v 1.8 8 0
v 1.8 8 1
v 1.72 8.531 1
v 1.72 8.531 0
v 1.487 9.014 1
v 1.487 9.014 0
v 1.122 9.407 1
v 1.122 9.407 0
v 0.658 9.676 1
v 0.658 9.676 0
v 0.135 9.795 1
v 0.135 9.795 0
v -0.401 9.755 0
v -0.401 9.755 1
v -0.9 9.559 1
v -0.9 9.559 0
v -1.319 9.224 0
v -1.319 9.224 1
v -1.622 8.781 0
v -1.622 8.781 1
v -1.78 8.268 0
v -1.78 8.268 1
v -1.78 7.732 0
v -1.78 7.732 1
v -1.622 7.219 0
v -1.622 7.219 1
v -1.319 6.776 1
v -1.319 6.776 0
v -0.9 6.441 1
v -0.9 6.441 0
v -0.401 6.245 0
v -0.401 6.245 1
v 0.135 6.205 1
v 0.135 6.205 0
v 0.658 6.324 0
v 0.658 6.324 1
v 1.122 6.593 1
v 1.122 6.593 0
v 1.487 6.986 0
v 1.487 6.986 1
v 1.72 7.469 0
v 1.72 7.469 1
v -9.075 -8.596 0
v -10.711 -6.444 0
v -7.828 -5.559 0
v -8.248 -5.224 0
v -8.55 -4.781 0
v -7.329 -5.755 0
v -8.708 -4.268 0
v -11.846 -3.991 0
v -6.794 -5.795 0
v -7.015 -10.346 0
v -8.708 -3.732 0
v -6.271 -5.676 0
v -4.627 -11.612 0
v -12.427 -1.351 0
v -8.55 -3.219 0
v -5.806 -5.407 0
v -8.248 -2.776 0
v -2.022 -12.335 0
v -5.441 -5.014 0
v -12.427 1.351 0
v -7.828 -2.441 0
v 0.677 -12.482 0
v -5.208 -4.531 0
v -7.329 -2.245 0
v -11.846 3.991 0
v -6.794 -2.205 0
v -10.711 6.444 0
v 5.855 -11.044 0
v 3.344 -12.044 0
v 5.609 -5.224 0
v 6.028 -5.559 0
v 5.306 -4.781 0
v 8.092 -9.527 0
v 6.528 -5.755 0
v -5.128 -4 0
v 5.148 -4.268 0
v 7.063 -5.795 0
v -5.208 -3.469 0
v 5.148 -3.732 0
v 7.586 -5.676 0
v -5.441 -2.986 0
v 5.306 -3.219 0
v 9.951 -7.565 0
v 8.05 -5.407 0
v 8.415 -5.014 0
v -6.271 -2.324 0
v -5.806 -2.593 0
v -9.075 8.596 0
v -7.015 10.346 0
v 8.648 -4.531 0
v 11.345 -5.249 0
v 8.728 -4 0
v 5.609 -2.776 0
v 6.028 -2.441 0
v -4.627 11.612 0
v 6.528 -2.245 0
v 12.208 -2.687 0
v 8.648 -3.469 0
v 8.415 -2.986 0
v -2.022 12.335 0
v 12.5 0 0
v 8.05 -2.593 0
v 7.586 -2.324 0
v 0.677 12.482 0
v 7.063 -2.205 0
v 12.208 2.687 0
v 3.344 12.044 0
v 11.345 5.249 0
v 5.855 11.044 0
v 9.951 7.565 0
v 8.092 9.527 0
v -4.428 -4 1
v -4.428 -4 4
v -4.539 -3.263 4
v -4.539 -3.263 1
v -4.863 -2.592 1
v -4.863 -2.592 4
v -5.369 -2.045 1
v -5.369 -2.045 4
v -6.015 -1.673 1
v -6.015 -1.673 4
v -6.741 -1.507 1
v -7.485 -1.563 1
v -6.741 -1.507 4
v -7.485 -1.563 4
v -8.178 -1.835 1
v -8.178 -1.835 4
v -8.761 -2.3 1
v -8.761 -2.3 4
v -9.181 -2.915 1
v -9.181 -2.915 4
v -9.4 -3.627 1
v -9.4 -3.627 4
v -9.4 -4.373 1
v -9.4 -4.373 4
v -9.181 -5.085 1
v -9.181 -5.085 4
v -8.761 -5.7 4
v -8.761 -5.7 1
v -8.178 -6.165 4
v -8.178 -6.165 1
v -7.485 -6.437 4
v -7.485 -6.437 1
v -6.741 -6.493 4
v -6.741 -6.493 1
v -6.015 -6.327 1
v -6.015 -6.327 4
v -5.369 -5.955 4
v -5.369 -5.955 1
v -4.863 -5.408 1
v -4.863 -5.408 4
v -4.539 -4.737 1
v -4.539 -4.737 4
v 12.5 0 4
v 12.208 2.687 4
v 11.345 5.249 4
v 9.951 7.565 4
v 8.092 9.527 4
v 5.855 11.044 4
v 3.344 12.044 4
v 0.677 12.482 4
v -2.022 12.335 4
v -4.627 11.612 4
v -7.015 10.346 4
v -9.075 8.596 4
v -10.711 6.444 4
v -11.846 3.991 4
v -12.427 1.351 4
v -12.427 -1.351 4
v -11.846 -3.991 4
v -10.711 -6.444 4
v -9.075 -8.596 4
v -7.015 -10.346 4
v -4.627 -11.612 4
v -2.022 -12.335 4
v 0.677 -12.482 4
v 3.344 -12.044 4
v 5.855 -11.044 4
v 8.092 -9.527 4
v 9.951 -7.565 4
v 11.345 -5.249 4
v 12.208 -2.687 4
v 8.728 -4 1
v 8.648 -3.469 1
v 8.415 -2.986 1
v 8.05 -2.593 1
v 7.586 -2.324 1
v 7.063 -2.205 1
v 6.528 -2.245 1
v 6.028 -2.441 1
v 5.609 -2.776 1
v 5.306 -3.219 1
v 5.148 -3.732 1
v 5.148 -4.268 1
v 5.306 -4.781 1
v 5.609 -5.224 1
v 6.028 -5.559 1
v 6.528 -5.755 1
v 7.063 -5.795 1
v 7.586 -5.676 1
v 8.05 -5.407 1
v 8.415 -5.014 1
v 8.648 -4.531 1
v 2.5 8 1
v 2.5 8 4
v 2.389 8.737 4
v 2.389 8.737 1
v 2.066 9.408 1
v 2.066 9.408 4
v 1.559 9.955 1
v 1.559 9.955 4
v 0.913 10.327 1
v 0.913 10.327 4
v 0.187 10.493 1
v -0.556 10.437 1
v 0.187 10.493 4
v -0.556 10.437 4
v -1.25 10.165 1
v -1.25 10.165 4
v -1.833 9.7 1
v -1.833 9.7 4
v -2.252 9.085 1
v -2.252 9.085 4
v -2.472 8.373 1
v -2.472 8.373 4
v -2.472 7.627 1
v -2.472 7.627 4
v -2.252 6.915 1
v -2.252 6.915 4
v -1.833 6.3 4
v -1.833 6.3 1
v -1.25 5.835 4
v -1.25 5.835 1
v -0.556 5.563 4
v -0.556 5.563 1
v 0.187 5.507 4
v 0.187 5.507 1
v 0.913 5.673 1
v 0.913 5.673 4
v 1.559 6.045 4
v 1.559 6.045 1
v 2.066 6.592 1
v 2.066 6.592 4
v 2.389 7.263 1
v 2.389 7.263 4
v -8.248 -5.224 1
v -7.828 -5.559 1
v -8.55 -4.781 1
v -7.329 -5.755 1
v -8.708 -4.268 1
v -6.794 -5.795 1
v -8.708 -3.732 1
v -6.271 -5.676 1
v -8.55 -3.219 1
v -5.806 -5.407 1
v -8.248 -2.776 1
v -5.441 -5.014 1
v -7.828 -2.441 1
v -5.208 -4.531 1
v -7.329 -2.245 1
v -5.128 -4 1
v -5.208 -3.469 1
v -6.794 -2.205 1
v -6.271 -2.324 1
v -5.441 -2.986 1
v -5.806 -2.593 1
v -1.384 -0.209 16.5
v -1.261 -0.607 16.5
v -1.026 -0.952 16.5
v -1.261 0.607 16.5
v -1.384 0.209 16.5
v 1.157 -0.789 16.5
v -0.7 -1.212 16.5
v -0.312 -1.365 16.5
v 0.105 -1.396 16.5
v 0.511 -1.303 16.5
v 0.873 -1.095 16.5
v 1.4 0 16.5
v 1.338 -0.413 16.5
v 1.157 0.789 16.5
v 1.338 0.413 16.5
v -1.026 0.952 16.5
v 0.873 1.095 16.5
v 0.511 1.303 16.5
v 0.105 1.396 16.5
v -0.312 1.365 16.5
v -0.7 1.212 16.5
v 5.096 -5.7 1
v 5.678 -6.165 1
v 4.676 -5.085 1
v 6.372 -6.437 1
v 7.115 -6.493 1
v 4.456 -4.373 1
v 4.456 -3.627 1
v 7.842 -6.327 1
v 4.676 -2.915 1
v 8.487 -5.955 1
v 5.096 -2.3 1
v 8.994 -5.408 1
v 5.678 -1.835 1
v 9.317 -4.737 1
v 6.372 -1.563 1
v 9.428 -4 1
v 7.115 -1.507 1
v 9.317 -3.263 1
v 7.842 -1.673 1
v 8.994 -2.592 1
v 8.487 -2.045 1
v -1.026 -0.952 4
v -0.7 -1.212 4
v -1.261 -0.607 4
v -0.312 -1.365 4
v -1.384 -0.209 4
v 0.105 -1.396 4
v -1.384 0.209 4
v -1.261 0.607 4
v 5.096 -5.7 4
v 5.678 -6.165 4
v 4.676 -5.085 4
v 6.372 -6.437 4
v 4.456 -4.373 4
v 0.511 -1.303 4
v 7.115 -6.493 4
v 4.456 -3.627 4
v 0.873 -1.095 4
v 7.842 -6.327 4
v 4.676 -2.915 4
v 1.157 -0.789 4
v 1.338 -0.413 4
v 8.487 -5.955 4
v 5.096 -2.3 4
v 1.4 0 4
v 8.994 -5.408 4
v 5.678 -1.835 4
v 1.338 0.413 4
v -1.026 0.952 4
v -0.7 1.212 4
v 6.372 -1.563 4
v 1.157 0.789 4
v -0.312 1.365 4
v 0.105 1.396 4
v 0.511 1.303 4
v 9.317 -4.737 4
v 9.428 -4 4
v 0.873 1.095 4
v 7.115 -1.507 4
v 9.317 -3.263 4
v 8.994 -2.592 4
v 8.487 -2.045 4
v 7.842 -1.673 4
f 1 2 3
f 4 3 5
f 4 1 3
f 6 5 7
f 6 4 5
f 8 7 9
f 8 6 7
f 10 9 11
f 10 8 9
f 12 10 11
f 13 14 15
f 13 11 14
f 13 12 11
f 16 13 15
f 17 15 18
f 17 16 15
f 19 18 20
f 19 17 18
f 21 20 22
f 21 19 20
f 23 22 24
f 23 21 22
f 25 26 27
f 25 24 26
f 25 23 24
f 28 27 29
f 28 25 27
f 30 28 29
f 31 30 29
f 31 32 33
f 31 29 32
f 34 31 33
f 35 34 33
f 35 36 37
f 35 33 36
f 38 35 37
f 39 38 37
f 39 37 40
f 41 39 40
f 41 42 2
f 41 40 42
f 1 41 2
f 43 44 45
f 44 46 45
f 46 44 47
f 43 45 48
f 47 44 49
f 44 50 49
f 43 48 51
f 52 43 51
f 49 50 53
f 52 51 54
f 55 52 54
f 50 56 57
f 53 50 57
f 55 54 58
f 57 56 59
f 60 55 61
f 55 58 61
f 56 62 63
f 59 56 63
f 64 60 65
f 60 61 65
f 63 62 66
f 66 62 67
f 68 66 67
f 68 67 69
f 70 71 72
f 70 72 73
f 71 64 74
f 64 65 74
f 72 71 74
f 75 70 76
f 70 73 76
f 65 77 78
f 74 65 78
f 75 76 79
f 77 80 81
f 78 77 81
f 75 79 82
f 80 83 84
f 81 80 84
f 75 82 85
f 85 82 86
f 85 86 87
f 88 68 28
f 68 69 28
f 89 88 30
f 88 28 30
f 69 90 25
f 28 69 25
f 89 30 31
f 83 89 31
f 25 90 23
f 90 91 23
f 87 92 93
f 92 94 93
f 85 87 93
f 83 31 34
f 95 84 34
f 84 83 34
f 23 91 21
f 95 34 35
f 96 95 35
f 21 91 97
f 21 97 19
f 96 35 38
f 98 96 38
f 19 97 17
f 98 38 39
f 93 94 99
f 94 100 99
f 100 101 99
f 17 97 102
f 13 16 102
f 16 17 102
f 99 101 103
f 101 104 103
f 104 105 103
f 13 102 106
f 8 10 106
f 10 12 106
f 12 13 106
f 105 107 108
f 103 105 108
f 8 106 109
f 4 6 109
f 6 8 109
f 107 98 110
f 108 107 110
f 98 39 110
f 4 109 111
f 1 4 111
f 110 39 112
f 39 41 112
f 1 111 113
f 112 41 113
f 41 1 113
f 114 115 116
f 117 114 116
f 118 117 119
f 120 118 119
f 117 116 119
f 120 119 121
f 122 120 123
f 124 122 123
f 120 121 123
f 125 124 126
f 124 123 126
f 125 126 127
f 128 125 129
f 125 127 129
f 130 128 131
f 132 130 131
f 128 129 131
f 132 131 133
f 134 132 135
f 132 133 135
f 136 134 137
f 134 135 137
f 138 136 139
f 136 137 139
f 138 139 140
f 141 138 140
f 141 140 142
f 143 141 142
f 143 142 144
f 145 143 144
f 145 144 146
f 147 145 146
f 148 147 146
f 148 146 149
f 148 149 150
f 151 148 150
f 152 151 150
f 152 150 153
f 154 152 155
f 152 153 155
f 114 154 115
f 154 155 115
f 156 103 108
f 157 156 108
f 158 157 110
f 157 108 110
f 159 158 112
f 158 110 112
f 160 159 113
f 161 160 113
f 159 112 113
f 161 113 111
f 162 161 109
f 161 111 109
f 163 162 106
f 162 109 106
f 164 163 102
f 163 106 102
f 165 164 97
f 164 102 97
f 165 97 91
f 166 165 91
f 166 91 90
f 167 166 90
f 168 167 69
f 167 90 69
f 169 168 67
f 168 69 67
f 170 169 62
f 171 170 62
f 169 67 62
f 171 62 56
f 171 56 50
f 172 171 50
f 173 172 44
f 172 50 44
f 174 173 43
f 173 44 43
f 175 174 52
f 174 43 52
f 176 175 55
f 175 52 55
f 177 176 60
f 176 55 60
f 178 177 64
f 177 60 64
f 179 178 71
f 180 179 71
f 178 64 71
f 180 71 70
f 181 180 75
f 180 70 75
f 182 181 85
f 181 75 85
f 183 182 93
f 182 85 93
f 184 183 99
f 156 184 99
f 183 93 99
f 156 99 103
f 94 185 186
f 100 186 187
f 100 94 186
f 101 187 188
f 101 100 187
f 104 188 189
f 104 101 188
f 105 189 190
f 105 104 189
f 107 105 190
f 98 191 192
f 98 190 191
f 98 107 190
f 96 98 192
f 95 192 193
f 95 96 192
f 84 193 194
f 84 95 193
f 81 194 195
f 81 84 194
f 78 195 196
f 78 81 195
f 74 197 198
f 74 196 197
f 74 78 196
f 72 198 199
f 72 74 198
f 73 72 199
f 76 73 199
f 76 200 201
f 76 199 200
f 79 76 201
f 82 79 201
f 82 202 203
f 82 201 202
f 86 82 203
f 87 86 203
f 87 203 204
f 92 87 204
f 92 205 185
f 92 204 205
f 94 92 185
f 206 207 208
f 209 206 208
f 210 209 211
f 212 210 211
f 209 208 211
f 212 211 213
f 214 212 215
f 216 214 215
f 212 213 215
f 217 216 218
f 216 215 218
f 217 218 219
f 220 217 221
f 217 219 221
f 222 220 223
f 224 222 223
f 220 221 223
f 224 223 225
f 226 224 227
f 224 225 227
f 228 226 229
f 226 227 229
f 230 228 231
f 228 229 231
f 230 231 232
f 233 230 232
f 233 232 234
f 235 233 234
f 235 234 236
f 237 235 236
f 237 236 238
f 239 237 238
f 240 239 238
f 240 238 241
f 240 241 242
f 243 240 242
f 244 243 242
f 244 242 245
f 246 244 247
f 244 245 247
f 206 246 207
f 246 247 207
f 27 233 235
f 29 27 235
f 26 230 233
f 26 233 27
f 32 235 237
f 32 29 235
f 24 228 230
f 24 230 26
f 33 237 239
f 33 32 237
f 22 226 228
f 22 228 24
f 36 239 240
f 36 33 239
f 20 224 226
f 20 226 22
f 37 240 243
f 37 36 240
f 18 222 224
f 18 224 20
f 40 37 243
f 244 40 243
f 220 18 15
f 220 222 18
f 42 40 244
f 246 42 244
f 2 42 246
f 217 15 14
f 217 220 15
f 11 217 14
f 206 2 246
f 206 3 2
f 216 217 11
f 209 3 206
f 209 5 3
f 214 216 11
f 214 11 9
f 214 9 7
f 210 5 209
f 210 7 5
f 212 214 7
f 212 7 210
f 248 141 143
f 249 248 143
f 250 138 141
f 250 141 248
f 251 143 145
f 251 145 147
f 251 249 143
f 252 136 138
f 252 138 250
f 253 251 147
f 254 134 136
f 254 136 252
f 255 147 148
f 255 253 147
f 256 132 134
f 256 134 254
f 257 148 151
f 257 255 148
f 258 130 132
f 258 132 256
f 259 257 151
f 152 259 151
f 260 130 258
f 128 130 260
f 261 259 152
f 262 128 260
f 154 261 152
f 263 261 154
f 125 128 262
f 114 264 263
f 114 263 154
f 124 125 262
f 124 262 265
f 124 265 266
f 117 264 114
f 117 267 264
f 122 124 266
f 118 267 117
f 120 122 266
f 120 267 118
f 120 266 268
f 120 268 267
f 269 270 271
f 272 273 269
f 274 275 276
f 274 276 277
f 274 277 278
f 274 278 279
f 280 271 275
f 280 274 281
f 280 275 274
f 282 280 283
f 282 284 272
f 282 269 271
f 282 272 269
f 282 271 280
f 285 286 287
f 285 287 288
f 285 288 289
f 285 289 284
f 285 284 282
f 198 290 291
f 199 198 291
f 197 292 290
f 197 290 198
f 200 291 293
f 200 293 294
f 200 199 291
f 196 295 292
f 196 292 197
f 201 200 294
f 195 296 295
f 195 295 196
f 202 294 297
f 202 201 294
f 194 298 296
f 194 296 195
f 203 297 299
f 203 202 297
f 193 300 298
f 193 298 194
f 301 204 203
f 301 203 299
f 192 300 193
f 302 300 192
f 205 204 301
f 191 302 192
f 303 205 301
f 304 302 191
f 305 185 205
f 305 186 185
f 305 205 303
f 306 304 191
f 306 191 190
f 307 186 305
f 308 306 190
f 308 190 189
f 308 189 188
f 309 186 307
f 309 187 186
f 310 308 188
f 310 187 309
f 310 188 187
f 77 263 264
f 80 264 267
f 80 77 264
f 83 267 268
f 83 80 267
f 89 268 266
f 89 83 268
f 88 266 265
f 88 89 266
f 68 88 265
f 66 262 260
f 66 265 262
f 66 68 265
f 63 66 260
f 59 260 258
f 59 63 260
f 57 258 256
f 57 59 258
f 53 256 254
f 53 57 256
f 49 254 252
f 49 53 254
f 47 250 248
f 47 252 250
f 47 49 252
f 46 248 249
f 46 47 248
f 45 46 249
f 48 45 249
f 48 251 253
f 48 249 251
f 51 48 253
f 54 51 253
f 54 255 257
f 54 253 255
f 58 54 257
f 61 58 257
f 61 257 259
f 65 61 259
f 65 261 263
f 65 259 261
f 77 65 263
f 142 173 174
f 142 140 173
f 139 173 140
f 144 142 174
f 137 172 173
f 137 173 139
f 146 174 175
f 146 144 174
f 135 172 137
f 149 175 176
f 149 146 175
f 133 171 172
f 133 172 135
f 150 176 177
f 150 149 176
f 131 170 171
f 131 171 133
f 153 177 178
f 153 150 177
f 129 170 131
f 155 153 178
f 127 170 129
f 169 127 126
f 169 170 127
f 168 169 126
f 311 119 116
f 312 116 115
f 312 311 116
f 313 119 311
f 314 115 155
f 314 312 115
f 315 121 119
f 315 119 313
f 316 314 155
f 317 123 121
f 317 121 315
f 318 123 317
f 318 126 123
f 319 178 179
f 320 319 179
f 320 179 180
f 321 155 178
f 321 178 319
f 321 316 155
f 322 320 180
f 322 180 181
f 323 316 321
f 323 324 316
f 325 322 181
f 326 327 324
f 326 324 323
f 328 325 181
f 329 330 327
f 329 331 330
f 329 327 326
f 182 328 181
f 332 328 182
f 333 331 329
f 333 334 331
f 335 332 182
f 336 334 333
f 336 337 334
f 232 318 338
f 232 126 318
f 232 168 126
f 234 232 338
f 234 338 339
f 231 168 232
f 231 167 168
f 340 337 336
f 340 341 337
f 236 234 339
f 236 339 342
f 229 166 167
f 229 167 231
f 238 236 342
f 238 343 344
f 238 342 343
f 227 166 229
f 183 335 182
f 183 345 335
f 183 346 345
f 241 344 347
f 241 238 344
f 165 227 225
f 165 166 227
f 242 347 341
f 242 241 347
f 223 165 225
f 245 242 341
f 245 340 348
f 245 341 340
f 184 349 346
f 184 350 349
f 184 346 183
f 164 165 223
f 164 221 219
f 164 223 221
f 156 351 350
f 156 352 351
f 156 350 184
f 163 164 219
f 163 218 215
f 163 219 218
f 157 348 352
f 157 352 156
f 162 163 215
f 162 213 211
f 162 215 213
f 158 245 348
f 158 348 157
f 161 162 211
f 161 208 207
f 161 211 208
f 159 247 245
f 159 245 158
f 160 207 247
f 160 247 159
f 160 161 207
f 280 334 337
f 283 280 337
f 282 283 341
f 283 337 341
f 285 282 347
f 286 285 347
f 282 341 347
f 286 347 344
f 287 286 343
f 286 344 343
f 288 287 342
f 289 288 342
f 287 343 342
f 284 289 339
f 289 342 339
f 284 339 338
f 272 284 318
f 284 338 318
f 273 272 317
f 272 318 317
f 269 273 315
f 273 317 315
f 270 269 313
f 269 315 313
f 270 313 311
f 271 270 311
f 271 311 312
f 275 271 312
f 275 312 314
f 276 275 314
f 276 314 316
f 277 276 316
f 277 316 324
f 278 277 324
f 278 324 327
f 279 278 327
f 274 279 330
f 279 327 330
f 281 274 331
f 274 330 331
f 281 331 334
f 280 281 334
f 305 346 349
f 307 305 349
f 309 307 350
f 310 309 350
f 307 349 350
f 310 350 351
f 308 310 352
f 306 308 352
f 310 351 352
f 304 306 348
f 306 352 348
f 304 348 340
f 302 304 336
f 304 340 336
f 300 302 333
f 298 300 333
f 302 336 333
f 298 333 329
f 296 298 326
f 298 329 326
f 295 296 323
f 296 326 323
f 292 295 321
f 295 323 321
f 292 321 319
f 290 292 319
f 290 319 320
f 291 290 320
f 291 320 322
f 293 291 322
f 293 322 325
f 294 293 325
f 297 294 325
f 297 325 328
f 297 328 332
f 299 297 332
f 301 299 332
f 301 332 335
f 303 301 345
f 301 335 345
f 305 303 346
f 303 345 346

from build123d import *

# Parameters (mm, degrees)
SKETCH_1_R               = 3
SKETCH_1_R_2             = 1.65
EXTRUDE_1_DEPTH          = 4
CUT_EXTRUDE_2_DEPTH      = 6.830951895
PATTERN_CIRCULAR_1_COUNT = 9
SKETCH_2_R               = 5
EXTRUDE_2_DEPTH          = 4
SKETCH_3_R               = 12.5
SKETCH_3_R_2             = 1.8
SKETCH_3_R_3             = 5
EXTRUDE_4_DEPTH          = 4
CUT_EXTRUDE_START        = 4
SKETCH_3_3_R             = 2.5
CUT_EXTRUDE_3_DEPTH      = 3
SKETCH_4_R               = 1.4
EXTRUDE_5_DEPTH          = 12.5


with BuildPart() as part:
    # 草图1 → 凸台-拉伸1 (new body)
    with BuildSketch(Plane.XY):
        Circle(SKETCH_1_R)
        Circle(SKETCH_1_R_2, mode=Mode.SUBTRACT)
    extrude(amount=EXTRUDE_1_DEPTH)

    # 草图1<3> → 切除-拉伸2 (cut, through all)
    with BuildSketch(Plane.XY):
        with BuildLine():
            Line((1.583201231, 0.595370355), (1.54440693, 0.580781573))
            ThreePointArc((1.54440693, 0.580781573), (1.623387112, 0.295151288), (1.65, 0))
            ThreePointArc((1.65, 0), (1.623387112, -0.295151288), (1.54440693, -0.580781573))
            Line((1.54440693, -0.580781573), (1.583201231, -0.595370355))
            add(Edge.make_bspline(
                [(1.583201231, -0.595370355), (1.595268082, -0.599908151), (1.629927649, -0.609960022), (1.698544644, -0.618780808), (1.810680065, -0.617601716), (1.954246735, -0.59352555), (2.132298369, -0.536822163), (2.302941373, -0.452472776), (2.42578745, -0.372108406), (2.505673341, -0.310927028), (2.533645284, -0.288342805)],
                knots=[0, 0, 0, 0, 0, 0.005604068, 0.015718248, 0.029959916, 0.048733667, 0.068727063, 0.096888892, 0.112551479, 0.112551479, 0.112551479, 0.112551479, 0.112551479], degree=4))
            ThreePointArc((2.533645284, -0.288342805), (2.545908038, -0.144403125), (2.55, 0))
            ThreePointArc((2.55, 0), (2.545908038, 0.144403125), (2.533645284, 0.288342805))
            add(Edge.make_bspline(
                [(1.583201231, 0.595370355), (1.595268082, 0.599908151), (1.629927649, 0.609960022), (1.698544644, 0.618780808), (1.810680065, 0.617601716), (1.954246735, 0.59352555), (2.132298369, 0.536822163), (2.302941373, 0.452472776), (2.42578745, 0.372108406), (2.505673341, 0.310927028), (2.533645284, 0.288342805)],
                knots=[0, 0, 0, 0, 0, 0.005604068, 0.015718248, 0.029959916, 0.048733667, 0.068727063, 0.096888892, 0.112551479, 0.112551479, 0.112551479, 0.112551479, 0.112551479], degree=4))
        make_face()
    cut_extrude_2 = extrude(amount=CUT_EXTRUDE_2_DEPTH, mode=Mode.SUBTRACT)

    # 阵列(圆周)1: 切除-拉伸2 ×9 about axis
    pattern_circular_1_axis = Axis((0, 0, 4), (0, 0, 1))
    for i in range(1, PATTERN_CIRCULAR_1_COUNT):
        add(cut_extrude_2.rotate(pattern_circular_1_axis, i * 360 / PATTERN_CIRCULAR_1_COUNT), mode=Mode.SUBTRACT)

    # 草图2 → 凸台-拉伸2 (add)
    with BuildSketch(Plane(origin=(0, 0, 0), x_dir=(-1, 0, 0), z_dir=(0, 0, -1))):
        Circle(SKETCH_2_R)
    extrude(amount=-EXTRUDE_2_DEPTH)

    # 草图3 → 凸台-拉伸4 (add)
    with BuildSketch(Plane.XY):
        Circle(SKETCH_3_R)
        with Locations((0, 8)):
            Circle(SKETCH_3_R_2, mode=Mode.SUBTRACT)
        with Locations((6.92820323, -4)):
            Circle(SKETCH_3_R_2, mode=Mode.SUBTRACT)
        with Locations((-6.92820323, -4)):
            Circle(SKETCH_3_R_2, mode=Mode.SUBTRACT)
        Circle(SKETCH_3_R_3, mode=Mode.SUBTRACT)
    extrude(amount=EXTRUDE_4_DEPTH)

    # 草图3<3> → 切除-拉伸3 (cut)
    with BuildSketch(Plane.XY.offset(CUT_EXTRUDE_START)):
        with Locations((0, 8)):
            Circle(SKETCH_3_3_R)
        with Locations((6.92820323, -4)):
            Circle(SKETCH_3_3_R)
        with Locations((-6.92820323, -4)):
            Circle(SKETCH_3_3_R)
    extrude(amount=-CUT_EXTRUDE_3_DEPTH, mode=Mode.SUBTRACT)

    # 草图4 → 凸台-拉伸5 (add)
    with BuildSketch(Plane.XY.offset(4)):
        Circle(SKETCH_4_R)
    extrude(amount=EXTRUDE_5_DEPTH)


solid = part.part
